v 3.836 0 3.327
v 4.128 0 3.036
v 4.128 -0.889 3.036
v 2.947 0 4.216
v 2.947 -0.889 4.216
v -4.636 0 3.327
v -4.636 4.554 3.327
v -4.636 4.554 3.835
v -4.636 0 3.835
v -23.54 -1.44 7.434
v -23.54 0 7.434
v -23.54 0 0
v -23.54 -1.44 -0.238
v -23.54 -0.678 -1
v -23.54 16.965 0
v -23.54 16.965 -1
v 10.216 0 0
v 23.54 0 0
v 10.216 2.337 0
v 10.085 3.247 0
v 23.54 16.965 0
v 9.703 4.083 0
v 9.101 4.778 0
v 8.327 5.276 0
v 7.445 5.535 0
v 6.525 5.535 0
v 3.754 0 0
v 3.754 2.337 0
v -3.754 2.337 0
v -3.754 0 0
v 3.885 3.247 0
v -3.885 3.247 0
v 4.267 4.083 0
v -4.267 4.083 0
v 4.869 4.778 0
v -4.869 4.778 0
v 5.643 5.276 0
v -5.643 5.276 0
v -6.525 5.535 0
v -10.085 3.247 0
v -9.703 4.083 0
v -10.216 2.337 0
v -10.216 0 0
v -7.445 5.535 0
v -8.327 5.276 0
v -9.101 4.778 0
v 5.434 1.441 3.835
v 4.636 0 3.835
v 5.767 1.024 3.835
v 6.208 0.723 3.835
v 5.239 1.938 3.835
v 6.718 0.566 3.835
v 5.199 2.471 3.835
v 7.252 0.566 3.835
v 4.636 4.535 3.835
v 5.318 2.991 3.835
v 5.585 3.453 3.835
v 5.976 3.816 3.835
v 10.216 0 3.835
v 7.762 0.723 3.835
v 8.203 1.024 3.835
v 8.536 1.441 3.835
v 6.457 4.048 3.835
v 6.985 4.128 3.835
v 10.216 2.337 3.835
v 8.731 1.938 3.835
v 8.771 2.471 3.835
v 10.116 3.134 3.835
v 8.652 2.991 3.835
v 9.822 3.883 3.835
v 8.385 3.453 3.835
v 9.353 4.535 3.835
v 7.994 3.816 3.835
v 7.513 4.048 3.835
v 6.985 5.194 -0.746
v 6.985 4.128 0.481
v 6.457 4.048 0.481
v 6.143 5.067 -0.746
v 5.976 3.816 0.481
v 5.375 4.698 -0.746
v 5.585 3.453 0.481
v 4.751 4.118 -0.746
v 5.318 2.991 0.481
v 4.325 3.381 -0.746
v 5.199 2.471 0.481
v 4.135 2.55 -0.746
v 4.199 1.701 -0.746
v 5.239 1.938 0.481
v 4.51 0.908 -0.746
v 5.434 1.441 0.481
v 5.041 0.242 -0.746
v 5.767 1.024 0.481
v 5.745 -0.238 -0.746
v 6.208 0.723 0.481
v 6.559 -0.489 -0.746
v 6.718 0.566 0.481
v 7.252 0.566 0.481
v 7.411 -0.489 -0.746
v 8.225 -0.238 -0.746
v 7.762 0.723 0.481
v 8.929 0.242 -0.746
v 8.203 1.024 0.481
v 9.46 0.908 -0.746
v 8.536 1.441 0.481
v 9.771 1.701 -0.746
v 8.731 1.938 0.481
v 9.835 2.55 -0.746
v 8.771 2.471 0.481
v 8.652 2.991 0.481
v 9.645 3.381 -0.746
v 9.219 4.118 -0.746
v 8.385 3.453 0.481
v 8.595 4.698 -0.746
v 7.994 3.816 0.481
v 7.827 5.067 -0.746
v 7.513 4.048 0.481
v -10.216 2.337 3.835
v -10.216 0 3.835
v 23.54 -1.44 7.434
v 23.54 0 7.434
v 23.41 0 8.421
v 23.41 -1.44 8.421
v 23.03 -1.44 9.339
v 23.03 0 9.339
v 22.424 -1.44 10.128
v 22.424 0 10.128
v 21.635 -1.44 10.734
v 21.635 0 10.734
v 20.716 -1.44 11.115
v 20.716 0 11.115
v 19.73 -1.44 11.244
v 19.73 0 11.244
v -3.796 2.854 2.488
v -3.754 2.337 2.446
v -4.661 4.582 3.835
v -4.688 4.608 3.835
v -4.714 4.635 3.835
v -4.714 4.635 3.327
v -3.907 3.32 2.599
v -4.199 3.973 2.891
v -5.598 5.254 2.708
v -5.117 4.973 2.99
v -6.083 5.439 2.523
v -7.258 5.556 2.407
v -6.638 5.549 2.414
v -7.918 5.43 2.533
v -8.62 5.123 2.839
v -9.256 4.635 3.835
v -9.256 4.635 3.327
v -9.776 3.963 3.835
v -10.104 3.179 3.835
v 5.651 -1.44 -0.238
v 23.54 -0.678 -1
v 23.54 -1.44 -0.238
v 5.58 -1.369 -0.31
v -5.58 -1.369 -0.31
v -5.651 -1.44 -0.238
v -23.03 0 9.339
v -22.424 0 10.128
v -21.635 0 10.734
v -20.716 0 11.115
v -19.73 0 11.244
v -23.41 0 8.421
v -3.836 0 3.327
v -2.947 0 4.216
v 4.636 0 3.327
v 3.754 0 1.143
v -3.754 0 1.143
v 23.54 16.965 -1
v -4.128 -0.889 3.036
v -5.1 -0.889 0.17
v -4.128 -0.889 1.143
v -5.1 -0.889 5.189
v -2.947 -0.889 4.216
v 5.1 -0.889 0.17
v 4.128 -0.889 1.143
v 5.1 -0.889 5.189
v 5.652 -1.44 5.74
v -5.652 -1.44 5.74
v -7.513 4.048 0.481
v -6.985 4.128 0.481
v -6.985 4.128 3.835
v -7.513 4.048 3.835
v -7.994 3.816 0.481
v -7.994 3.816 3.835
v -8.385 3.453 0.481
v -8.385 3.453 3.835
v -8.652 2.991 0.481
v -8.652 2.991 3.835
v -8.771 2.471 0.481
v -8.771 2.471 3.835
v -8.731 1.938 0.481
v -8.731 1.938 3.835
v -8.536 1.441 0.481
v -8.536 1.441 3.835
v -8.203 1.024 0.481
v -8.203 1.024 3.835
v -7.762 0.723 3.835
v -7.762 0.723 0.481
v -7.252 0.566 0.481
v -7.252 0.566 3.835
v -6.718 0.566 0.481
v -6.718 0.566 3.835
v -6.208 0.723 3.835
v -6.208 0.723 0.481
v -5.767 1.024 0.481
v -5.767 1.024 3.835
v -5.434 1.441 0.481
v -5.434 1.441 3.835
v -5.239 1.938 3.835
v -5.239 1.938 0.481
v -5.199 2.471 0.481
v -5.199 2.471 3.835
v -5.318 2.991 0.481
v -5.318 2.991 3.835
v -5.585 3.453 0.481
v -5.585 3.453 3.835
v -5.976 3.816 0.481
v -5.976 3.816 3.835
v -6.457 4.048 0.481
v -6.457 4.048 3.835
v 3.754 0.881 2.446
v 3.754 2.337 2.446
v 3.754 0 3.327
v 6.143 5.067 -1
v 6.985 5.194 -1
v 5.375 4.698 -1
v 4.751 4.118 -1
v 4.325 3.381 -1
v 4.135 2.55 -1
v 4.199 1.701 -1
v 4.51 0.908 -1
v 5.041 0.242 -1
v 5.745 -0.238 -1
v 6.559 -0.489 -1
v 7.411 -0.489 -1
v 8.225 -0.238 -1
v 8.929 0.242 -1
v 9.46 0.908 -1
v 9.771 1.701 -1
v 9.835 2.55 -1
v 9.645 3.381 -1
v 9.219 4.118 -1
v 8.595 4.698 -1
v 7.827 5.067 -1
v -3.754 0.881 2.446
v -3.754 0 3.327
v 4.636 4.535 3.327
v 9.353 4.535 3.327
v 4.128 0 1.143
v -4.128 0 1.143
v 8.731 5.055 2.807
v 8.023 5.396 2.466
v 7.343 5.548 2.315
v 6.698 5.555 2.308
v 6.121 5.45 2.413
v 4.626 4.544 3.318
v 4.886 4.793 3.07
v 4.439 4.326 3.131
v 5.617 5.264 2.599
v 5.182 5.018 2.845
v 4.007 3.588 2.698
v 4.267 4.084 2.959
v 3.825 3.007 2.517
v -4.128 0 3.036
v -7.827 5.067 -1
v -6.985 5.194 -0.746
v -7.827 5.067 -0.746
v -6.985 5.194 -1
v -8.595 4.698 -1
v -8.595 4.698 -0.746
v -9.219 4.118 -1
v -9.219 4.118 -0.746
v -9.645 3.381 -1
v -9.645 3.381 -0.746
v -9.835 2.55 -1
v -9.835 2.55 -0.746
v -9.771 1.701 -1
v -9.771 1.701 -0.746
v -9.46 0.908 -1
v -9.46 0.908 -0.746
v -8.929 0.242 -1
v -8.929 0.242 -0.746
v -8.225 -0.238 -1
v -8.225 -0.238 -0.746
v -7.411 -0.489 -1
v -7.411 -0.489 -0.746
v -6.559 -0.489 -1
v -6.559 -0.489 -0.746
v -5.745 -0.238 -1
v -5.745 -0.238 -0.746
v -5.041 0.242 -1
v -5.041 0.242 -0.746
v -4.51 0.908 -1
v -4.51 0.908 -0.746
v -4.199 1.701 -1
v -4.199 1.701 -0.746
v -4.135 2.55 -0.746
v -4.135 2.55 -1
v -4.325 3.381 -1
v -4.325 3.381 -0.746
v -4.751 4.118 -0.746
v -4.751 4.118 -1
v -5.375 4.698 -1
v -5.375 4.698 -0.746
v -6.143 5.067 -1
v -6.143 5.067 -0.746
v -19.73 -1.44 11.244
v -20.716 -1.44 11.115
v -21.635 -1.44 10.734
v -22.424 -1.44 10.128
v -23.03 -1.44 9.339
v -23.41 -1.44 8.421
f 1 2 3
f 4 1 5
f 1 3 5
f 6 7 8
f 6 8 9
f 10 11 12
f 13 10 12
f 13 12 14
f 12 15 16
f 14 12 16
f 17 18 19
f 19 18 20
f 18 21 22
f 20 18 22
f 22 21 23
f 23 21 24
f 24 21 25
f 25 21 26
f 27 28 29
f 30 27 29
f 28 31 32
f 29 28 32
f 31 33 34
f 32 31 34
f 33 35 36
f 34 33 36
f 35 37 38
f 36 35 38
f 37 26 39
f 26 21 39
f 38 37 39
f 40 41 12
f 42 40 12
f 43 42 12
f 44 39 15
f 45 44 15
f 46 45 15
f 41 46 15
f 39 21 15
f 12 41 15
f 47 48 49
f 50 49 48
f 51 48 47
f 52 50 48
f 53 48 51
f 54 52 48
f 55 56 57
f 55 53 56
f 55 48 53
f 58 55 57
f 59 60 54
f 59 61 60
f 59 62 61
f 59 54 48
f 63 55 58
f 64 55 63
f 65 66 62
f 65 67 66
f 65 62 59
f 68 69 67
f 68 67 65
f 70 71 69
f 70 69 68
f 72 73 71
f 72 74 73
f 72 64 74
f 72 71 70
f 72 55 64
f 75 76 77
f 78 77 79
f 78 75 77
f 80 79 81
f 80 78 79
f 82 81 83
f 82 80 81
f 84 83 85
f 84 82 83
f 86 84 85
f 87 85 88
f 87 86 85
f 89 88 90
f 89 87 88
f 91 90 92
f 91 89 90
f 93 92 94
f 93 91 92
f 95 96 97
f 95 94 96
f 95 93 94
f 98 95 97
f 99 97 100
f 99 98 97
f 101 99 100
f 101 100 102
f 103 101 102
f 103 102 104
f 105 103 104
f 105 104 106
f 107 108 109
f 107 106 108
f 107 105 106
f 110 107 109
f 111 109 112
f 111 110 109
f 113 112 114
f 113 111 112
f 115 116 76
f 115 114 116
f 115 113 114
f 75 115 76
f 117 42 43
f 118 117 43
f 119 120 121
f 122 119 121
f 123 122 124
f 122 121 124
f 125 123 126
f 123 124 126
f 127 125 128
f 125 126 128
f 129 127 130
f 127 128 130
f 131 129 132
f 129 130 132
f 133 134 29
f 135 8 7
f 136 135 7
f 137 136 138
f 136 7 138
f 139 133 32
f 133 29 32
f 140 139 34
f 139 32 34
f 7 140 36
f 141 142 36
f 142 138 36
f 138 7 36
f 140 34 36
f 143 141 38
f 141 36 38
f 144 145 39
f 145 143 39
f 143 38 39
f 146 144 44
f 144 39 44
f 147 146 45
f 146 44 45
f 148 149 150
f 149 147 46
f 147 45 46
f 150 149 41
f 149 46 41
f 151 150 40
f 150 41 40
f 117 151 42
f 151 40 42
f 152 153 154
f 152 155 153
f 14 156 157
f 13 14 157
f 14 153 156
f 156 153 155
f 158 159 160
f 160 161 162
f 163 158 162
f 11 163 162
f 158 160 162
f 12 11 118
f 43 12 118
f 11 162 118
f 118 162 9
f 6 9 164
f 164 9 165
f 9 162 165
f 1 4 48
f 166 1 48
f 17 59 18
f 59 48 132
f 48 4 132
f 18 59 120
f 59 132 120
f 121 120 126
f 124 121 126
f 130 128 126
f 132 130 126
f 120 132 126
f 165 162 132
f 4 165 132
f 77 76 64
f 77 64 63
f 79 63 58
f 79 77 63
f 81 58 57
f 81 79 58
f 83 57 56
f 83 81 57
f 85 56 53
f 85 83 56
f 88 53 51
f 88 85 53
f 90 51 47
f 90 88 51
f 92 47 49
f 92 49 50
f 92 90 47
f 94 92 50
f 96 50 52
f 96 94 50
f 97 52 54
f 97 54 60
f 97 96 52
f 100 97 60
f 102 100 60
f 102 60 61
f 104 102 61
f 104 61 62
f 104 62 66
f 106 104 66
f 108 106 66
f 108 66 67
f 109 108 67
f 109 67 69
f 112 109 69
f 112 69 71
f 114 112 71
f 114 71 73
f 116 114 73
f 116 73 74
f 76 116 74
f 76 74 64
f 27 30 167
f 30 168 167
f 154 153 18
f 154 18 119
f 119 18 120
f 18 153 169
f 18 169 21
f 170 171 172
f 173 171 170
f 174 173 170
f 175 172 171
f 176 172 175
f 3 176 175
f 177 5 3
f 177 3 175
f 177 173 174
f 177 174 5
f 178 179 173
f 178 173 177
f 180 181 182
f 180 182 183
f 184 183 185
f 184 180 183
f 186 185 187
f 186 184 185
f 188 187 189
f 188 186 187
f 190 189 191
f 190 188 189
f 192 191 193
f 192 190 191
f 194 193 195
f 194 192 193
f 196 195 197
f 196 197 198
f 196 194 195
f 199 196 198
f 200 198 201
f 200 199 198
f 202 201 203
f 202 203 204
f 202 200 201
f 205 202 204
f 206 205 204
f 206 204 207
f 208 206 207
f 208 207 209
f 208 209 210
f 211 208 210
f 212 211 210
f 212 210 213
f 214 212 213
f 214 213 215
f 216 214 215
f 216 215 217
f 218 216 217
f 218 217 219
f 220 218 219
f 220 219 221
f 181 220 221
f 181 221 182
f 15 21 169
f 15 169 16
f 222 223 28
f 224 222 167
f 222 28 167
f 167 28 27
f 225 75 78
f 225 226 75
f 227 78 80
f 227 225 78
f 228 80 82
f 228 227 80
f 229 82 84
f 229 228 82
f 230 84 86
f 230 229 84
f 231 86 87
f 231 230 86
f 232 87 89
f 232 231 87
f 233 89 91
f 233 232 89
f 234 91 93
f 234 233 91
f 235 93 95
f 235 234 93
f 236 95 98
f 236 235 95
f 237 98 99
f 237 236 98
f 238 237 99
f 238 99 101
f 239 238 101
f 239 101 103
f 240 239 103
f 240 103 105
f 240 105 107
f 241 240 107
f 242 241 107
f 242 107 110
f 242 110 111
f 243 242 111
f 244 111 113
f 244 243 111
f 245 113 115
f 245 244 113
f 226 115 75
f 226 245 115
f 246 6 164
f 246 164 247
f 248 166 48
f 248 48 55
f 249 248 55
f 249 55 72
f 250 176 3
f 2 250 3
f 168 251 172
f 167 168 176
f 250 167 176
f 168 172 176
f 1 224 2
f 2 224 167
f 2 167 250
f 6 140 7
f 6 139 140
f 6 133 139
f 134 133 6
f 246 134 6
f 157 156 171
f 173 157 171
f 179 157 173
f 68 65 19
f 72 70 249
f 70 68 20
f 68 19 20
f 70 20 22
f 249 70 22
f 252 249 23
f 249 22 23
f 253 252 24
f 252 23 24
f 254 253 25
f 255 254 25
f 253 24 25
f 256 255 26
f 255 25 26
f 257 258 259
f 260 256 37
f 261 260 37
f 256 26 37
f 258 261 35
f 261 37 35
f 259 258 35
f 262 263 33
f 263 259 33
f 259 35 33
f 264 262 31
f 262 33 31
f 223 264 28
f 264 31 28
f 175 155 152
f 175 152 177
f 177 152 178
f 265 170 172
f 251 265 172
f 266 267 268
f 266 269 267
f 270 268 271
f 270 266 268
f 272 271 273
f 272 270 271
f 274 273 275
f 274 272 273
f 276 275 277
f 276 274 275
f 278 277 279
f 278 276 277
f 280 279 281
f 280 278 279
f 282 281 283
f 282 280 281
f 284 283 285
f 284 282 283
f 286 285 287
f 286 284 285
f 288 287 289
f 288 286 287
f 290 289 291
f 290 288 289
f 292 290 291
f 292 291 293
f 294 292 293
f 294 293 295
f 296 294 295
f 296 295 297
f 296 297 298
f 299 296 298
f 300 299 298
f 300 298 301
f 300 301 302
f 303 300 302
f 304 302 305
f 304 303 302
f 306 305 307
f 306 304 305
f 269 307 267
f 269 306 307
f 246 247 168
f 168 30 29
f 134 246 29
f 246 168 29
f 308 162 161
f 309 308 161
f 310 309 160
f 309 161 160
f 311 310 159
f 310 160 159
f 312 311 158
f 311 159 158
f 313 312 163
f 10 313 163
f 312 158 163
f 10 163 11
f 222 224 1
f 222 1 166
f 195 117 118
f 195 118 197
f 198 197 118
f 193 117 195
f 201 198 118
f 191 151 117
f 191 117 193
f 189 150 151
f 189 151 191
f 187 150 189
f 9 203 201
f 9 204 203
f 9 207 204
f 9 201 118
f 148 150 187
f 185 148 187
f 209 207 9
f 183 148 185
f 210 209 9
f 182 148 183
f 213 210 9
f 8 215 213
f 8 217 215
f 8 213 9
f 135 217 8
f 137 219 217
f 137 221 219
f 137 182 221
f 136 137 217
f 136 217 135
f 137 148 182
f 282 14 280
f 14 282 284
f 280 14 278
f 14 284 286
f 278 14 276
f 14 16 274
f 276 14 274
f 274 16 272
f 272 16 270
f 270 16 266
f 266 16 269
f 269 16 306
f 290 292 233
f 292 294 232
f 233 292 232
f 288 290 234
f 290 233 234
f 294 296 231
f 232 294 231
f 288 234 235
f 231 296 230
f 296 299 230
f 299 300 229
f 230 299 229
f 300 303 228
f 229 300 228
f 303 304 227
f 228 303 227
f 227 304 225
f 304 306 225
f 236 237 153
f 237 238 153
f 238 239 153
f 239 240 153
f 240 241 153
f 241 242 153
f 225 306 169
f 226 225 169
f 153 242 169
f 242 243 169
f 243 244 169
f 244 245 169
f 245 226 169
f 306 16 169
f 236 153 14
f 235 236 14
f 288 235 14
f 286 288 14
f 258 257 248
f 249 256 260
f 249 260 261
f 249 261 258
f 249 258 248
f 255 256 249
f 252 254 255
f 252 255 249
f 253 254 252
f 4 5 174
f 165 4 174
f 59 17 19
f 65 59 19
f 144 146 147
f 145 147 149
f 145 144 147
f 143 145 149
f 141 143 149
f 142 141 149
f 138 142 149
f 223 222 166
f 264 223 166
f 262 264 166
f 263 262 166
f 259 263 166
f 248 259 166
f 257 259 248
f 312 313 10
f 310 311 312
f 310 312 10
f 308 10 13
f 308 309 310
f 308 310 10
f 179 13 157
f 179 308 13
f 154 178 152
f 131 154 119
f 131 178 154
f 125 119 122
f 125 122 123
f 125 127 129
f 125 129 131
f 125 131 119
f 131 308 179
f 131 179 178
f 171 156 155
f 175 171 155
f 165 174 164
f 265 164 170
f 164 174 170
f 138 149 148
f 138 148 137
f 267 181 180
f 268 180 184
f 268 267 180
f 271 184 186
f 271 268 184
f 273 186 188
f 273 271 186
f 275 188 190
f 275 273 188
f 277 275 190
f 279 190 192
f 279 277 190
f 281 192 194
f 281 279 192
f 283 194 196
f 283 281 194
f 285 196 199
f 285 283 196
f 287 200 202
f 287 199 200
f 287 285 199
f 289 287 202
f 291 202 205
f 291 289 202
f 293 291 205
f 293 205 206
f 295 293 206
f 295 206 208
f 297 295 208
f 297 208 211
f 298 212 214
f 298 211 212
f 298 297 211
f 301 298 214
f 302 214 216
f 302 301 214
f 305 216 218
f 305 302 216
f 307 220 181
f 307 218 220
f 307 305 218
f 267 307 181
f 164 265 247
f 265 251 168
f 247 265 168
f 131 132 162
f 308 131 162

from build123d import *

# Parameters (mm, degrees)
BOSS_EXTRUDE1_DEPTH                           = 1
BOSS_EXTRUDE2_DEPTH                           = 1.44
CUT_EXTRUDE1_DEPTH                            = 32.926898982
SKETCH4_W                                     = 11.303
SKETCH4_H                                     = 6.1214
CUT_EXTRUDE2_DEPTH                            = 0.551
CUT_EXTRUDE2_DRAFT                            = -45
SKETCH5_R                                     = 1.7907
BOSS_EXTRUDE3_DEPTH                           = 3.8354
CSK_FOR_4_FLAT_HEAD_MACHINE_SCREW1_AT_2_COUNT = 2
CSK_FOR_4_FLAT_HEAD_MACHINE_SCREW1_AT_2_PITCH = 13.97
CUT_EXTRUDE3_START                            = -0.508
CUT_EXTRUDE3_DEPTH                            = 31.455448587
CUT_EXTRUDE3_OTHER_WAY_DEPTH                  = 2.6924
CUT_EXTRUDE3_OTHER_WAY_TAPER                  = 45
CHAMFER1_SIZE                                 = 0.762


with BuildPart() as part:
    # Sketch1 → Boss-Extrude1 (new body)
    with BuildSketch(Plane.XY):
        Polygon((-23.54, 16.9654), (-6.35, 16.9654), (6.35, 16.9654), (23.54, 16.9654), (23.54, 0), (-23.54, 0), align=None)
    extrude(amount=-BOSS_EXTRUDE1_DEPTH)

    # Sketch2 → Boss-Extrude2 (add)
    with BuildSketch(Plane.XZ):
        with BuildLine():
            Line((-23.54, 0), (-23.54, -1))
            Line((-23.54, -1), (23.54, -1))
            Line((23.54, -1), (23.54, 0))
            Line((23.54, 0), (23.54, 7.434399914))
            ThreePointArc((23.54, 7.434399914), (22.424076836, 10.12847675), (19.73, 11.244399914))
            Line((19.73, 11.244399914), (-19.73, 11.244399914))
            ThreePointArc((-19.73, 11.244399914), (-22.424076836, 10.12847675), (-23.54, 7.434399914))
            Line((-23.54, 7.434399914), (-23.54, 0))
        make_face()
    extrude(amount=BOSS_EXTRUDE2_DEPTH)

    # Sketch3 → Cut-Extrude1 (cut, through all)
    with BuildSketch(Plane.XZ.offset(1.44)):
        Polygon((4.1275, 1.143), (4.1275, 3.035802139), (2.946902139, 4.2164), (-2.946902139, 4.2164), (-4.1275, 3.035802139), (-4.1275, 1.143), align=None)
    extrude(amount=-CUT_EXTRUDE1_DEPTH, mode=Mode.SUBTRACT)


with BuildPart() as cut_extrude2_tool:
    # Sketch4 → Cut-Extrude2 (with draft: the straight prism first)
    with BuildSketch(Plane.XZ.offset(1.44)):
        with Locations((0, 2.6797)):
            Rectangle(SKETCH4_W, SKETCH4_H)
    extrude(amount=-CUT_EXTRUDE2_DEPTH)
    # Cut-Extrude2: the draft: its side faces are tilted about the plane it starts from
    cut_extrude2_sides = [cut_extrude2_tool.faces().sort_by_distance(p)[0] for p in [
        (5.6515, -1.1645, 2.6797),
        (0, -1.1645, 5.7404),
        (-5.6515, -1.1645, 2.6797),
        (0, -1.1645, -0.381),
    ]]
    draft(cut_extrude2_sides, Plane.XZ.offset(1.44), CUT_EXTRUDE2_DRAFT)


with BuildPart() as part_1:
    add(part.part)

    # Cut-Extrude2: cut by cut_extrude2_tool
    add(cut_extrude2_tool.part, mode=Mode.SUBTRACT)

    # Sketch5 → Boss-Extrude3 (add)
    # profile 1 of 2: a face of its own
    with BuildSketch(Plane.XY):
        with BuildLine():
            Line((10.2157, 0), (10.2157, 2.3368))
            ThreePointArc((10.2157, 2.3368), (6.985, 5.5675), (3.7543, 2.3368))
            Line((3.7543, 2.3368), (3.7543, 0))
            Line((3.7543, 0), (10.2157, 0))
        make_face()
        with Locations(Location((6.985, 2.3368, 0), (0, 0, 90))):
            Circle(SKETCH5_R, mode=Mode.SUBTRACT)
    # profile 2 of 2: a face of its own
    with BuildSketch(Plane.XY):
        with BuildLine():
            Line((-3.7543, 0), (-3.7543, 2.3368))
            ThreePointArc((-3.7543, 2.3368), (-6.985, 5.5675), (-10.2157, 2.3368))
            Line((-10.2157, 2.3368), (-10.2157, 0))
            Line((-10.2157, 0), (-3.7543, 0))
        make_face()
        with Locations(Location((-6.985, 2.3368, 0), (0, 0, 90))):
            Circle(SKETCH5_R, mode=Mode.SUBTRACT)
    extrude(amount=BOSS_EXTRUDE3_DEPTH)

    # Sketch7 → CSK for #4 Flat Head Machine Screw1 (revolve, cut)
    with BuildSketch(Plane(origin=(6.985, 2.3368, -1), x_dir=(0, 1, 0), z_dir=(1, 0, 0))):
        Polygon((0, 0), (0, 12.244399914), (1.63195, 12.244399914), (1.63195, 1.663834001), (2.8575, 0.254), (2.8575, 0), align=None)
    csk_for_4_flat_head_machine_screw1 = revolve(axis=Axis((6.985, 2.3368, -7.35), (0, 0, 1)), mode=Mode.SUBTRACT)

    # CSK for #4 Flat Head Machine Screw1 at 2: CSK for #4 Flat Head Machine Screw1 ×2
    with Locations(*[(-i * CSK_FOR_4_FLAT_HEAD_MACHINE_SCREW1_AT_2_PITCH, 0, 0) for i in range(1, CSK_FOR_4_FLAT_HEAD_MACHINE_SCREW1_AT_2_COUNT)]):
        add(csk_for_4_flat_head_machine_screw1, mode=Mode.SUBTRACT)

    # Sketch8 → Cut-Extrude3 (cut)
    with BuildSketch(Plane.XY.offset(3.8354).offset(CUT_EXTRUDE3_START)):
        Polygon((-4.6355, 0), (4.6355, 0), (4.6355, 4.535000865), (11.25247277, 4.535000865), (11.25247277, 13.015959744), (-11.892824973, 13.015959744), (-11.892824973, 4.635051274), (-4.6355, 4.635051274), align=None)
    extrude(amount=CUT_EXTRUDE3_DEPTH, mode=Mode.SUBTRACT)

    # Sketch8 → Cut-Extrude3 other way (cut)
    with BuildSketch(Plane.XY.offset(3.8354).offset(CUT_EXTRUDE3_START)):
        Polygon((-4.6355, 0), (4.6355, 0), (4.6355, 4.535000865), (11.25247277, 4.535000865), (11.25247277, 13.015959744), (-11.892824973, 13.015959744), (-11.892824973, 4.635051274), (-4.6355, 4.635051274), align=None)
    extrude(amount=-CUT_EXTRUDE3_OTHER_WAY_DEPTH, taper=CUT_EXTRUDE3_OTHER_WAY_TAPER, mode=Mode.SUBTRACT)

    # Chamfer1
    # the kernel refuses this chamfer: 0.762 mm, written as the material it takes off along each edge
    with BuildSketch(Plane(origin=(-25.499622437, -1.44, -1), x_dir=(0, 0.9996219169112966, -0.027495876610586417), z_dir=(1, 0, 0))) as chamfer1_piece_1:
        Polygon((CHAMFER1_SIZE * 0.999621916911, CHAMFER1_SIZE * 0.0274958766106), (-CHAMFER1_SIZE * 0.0274958766106, CHAMFER1_SIZE * 0.999621916911), (0, 0), align=None)
    extrude(amount=50.999244874, mode=Mode.SUBTRACT)


solid = part_1.part
